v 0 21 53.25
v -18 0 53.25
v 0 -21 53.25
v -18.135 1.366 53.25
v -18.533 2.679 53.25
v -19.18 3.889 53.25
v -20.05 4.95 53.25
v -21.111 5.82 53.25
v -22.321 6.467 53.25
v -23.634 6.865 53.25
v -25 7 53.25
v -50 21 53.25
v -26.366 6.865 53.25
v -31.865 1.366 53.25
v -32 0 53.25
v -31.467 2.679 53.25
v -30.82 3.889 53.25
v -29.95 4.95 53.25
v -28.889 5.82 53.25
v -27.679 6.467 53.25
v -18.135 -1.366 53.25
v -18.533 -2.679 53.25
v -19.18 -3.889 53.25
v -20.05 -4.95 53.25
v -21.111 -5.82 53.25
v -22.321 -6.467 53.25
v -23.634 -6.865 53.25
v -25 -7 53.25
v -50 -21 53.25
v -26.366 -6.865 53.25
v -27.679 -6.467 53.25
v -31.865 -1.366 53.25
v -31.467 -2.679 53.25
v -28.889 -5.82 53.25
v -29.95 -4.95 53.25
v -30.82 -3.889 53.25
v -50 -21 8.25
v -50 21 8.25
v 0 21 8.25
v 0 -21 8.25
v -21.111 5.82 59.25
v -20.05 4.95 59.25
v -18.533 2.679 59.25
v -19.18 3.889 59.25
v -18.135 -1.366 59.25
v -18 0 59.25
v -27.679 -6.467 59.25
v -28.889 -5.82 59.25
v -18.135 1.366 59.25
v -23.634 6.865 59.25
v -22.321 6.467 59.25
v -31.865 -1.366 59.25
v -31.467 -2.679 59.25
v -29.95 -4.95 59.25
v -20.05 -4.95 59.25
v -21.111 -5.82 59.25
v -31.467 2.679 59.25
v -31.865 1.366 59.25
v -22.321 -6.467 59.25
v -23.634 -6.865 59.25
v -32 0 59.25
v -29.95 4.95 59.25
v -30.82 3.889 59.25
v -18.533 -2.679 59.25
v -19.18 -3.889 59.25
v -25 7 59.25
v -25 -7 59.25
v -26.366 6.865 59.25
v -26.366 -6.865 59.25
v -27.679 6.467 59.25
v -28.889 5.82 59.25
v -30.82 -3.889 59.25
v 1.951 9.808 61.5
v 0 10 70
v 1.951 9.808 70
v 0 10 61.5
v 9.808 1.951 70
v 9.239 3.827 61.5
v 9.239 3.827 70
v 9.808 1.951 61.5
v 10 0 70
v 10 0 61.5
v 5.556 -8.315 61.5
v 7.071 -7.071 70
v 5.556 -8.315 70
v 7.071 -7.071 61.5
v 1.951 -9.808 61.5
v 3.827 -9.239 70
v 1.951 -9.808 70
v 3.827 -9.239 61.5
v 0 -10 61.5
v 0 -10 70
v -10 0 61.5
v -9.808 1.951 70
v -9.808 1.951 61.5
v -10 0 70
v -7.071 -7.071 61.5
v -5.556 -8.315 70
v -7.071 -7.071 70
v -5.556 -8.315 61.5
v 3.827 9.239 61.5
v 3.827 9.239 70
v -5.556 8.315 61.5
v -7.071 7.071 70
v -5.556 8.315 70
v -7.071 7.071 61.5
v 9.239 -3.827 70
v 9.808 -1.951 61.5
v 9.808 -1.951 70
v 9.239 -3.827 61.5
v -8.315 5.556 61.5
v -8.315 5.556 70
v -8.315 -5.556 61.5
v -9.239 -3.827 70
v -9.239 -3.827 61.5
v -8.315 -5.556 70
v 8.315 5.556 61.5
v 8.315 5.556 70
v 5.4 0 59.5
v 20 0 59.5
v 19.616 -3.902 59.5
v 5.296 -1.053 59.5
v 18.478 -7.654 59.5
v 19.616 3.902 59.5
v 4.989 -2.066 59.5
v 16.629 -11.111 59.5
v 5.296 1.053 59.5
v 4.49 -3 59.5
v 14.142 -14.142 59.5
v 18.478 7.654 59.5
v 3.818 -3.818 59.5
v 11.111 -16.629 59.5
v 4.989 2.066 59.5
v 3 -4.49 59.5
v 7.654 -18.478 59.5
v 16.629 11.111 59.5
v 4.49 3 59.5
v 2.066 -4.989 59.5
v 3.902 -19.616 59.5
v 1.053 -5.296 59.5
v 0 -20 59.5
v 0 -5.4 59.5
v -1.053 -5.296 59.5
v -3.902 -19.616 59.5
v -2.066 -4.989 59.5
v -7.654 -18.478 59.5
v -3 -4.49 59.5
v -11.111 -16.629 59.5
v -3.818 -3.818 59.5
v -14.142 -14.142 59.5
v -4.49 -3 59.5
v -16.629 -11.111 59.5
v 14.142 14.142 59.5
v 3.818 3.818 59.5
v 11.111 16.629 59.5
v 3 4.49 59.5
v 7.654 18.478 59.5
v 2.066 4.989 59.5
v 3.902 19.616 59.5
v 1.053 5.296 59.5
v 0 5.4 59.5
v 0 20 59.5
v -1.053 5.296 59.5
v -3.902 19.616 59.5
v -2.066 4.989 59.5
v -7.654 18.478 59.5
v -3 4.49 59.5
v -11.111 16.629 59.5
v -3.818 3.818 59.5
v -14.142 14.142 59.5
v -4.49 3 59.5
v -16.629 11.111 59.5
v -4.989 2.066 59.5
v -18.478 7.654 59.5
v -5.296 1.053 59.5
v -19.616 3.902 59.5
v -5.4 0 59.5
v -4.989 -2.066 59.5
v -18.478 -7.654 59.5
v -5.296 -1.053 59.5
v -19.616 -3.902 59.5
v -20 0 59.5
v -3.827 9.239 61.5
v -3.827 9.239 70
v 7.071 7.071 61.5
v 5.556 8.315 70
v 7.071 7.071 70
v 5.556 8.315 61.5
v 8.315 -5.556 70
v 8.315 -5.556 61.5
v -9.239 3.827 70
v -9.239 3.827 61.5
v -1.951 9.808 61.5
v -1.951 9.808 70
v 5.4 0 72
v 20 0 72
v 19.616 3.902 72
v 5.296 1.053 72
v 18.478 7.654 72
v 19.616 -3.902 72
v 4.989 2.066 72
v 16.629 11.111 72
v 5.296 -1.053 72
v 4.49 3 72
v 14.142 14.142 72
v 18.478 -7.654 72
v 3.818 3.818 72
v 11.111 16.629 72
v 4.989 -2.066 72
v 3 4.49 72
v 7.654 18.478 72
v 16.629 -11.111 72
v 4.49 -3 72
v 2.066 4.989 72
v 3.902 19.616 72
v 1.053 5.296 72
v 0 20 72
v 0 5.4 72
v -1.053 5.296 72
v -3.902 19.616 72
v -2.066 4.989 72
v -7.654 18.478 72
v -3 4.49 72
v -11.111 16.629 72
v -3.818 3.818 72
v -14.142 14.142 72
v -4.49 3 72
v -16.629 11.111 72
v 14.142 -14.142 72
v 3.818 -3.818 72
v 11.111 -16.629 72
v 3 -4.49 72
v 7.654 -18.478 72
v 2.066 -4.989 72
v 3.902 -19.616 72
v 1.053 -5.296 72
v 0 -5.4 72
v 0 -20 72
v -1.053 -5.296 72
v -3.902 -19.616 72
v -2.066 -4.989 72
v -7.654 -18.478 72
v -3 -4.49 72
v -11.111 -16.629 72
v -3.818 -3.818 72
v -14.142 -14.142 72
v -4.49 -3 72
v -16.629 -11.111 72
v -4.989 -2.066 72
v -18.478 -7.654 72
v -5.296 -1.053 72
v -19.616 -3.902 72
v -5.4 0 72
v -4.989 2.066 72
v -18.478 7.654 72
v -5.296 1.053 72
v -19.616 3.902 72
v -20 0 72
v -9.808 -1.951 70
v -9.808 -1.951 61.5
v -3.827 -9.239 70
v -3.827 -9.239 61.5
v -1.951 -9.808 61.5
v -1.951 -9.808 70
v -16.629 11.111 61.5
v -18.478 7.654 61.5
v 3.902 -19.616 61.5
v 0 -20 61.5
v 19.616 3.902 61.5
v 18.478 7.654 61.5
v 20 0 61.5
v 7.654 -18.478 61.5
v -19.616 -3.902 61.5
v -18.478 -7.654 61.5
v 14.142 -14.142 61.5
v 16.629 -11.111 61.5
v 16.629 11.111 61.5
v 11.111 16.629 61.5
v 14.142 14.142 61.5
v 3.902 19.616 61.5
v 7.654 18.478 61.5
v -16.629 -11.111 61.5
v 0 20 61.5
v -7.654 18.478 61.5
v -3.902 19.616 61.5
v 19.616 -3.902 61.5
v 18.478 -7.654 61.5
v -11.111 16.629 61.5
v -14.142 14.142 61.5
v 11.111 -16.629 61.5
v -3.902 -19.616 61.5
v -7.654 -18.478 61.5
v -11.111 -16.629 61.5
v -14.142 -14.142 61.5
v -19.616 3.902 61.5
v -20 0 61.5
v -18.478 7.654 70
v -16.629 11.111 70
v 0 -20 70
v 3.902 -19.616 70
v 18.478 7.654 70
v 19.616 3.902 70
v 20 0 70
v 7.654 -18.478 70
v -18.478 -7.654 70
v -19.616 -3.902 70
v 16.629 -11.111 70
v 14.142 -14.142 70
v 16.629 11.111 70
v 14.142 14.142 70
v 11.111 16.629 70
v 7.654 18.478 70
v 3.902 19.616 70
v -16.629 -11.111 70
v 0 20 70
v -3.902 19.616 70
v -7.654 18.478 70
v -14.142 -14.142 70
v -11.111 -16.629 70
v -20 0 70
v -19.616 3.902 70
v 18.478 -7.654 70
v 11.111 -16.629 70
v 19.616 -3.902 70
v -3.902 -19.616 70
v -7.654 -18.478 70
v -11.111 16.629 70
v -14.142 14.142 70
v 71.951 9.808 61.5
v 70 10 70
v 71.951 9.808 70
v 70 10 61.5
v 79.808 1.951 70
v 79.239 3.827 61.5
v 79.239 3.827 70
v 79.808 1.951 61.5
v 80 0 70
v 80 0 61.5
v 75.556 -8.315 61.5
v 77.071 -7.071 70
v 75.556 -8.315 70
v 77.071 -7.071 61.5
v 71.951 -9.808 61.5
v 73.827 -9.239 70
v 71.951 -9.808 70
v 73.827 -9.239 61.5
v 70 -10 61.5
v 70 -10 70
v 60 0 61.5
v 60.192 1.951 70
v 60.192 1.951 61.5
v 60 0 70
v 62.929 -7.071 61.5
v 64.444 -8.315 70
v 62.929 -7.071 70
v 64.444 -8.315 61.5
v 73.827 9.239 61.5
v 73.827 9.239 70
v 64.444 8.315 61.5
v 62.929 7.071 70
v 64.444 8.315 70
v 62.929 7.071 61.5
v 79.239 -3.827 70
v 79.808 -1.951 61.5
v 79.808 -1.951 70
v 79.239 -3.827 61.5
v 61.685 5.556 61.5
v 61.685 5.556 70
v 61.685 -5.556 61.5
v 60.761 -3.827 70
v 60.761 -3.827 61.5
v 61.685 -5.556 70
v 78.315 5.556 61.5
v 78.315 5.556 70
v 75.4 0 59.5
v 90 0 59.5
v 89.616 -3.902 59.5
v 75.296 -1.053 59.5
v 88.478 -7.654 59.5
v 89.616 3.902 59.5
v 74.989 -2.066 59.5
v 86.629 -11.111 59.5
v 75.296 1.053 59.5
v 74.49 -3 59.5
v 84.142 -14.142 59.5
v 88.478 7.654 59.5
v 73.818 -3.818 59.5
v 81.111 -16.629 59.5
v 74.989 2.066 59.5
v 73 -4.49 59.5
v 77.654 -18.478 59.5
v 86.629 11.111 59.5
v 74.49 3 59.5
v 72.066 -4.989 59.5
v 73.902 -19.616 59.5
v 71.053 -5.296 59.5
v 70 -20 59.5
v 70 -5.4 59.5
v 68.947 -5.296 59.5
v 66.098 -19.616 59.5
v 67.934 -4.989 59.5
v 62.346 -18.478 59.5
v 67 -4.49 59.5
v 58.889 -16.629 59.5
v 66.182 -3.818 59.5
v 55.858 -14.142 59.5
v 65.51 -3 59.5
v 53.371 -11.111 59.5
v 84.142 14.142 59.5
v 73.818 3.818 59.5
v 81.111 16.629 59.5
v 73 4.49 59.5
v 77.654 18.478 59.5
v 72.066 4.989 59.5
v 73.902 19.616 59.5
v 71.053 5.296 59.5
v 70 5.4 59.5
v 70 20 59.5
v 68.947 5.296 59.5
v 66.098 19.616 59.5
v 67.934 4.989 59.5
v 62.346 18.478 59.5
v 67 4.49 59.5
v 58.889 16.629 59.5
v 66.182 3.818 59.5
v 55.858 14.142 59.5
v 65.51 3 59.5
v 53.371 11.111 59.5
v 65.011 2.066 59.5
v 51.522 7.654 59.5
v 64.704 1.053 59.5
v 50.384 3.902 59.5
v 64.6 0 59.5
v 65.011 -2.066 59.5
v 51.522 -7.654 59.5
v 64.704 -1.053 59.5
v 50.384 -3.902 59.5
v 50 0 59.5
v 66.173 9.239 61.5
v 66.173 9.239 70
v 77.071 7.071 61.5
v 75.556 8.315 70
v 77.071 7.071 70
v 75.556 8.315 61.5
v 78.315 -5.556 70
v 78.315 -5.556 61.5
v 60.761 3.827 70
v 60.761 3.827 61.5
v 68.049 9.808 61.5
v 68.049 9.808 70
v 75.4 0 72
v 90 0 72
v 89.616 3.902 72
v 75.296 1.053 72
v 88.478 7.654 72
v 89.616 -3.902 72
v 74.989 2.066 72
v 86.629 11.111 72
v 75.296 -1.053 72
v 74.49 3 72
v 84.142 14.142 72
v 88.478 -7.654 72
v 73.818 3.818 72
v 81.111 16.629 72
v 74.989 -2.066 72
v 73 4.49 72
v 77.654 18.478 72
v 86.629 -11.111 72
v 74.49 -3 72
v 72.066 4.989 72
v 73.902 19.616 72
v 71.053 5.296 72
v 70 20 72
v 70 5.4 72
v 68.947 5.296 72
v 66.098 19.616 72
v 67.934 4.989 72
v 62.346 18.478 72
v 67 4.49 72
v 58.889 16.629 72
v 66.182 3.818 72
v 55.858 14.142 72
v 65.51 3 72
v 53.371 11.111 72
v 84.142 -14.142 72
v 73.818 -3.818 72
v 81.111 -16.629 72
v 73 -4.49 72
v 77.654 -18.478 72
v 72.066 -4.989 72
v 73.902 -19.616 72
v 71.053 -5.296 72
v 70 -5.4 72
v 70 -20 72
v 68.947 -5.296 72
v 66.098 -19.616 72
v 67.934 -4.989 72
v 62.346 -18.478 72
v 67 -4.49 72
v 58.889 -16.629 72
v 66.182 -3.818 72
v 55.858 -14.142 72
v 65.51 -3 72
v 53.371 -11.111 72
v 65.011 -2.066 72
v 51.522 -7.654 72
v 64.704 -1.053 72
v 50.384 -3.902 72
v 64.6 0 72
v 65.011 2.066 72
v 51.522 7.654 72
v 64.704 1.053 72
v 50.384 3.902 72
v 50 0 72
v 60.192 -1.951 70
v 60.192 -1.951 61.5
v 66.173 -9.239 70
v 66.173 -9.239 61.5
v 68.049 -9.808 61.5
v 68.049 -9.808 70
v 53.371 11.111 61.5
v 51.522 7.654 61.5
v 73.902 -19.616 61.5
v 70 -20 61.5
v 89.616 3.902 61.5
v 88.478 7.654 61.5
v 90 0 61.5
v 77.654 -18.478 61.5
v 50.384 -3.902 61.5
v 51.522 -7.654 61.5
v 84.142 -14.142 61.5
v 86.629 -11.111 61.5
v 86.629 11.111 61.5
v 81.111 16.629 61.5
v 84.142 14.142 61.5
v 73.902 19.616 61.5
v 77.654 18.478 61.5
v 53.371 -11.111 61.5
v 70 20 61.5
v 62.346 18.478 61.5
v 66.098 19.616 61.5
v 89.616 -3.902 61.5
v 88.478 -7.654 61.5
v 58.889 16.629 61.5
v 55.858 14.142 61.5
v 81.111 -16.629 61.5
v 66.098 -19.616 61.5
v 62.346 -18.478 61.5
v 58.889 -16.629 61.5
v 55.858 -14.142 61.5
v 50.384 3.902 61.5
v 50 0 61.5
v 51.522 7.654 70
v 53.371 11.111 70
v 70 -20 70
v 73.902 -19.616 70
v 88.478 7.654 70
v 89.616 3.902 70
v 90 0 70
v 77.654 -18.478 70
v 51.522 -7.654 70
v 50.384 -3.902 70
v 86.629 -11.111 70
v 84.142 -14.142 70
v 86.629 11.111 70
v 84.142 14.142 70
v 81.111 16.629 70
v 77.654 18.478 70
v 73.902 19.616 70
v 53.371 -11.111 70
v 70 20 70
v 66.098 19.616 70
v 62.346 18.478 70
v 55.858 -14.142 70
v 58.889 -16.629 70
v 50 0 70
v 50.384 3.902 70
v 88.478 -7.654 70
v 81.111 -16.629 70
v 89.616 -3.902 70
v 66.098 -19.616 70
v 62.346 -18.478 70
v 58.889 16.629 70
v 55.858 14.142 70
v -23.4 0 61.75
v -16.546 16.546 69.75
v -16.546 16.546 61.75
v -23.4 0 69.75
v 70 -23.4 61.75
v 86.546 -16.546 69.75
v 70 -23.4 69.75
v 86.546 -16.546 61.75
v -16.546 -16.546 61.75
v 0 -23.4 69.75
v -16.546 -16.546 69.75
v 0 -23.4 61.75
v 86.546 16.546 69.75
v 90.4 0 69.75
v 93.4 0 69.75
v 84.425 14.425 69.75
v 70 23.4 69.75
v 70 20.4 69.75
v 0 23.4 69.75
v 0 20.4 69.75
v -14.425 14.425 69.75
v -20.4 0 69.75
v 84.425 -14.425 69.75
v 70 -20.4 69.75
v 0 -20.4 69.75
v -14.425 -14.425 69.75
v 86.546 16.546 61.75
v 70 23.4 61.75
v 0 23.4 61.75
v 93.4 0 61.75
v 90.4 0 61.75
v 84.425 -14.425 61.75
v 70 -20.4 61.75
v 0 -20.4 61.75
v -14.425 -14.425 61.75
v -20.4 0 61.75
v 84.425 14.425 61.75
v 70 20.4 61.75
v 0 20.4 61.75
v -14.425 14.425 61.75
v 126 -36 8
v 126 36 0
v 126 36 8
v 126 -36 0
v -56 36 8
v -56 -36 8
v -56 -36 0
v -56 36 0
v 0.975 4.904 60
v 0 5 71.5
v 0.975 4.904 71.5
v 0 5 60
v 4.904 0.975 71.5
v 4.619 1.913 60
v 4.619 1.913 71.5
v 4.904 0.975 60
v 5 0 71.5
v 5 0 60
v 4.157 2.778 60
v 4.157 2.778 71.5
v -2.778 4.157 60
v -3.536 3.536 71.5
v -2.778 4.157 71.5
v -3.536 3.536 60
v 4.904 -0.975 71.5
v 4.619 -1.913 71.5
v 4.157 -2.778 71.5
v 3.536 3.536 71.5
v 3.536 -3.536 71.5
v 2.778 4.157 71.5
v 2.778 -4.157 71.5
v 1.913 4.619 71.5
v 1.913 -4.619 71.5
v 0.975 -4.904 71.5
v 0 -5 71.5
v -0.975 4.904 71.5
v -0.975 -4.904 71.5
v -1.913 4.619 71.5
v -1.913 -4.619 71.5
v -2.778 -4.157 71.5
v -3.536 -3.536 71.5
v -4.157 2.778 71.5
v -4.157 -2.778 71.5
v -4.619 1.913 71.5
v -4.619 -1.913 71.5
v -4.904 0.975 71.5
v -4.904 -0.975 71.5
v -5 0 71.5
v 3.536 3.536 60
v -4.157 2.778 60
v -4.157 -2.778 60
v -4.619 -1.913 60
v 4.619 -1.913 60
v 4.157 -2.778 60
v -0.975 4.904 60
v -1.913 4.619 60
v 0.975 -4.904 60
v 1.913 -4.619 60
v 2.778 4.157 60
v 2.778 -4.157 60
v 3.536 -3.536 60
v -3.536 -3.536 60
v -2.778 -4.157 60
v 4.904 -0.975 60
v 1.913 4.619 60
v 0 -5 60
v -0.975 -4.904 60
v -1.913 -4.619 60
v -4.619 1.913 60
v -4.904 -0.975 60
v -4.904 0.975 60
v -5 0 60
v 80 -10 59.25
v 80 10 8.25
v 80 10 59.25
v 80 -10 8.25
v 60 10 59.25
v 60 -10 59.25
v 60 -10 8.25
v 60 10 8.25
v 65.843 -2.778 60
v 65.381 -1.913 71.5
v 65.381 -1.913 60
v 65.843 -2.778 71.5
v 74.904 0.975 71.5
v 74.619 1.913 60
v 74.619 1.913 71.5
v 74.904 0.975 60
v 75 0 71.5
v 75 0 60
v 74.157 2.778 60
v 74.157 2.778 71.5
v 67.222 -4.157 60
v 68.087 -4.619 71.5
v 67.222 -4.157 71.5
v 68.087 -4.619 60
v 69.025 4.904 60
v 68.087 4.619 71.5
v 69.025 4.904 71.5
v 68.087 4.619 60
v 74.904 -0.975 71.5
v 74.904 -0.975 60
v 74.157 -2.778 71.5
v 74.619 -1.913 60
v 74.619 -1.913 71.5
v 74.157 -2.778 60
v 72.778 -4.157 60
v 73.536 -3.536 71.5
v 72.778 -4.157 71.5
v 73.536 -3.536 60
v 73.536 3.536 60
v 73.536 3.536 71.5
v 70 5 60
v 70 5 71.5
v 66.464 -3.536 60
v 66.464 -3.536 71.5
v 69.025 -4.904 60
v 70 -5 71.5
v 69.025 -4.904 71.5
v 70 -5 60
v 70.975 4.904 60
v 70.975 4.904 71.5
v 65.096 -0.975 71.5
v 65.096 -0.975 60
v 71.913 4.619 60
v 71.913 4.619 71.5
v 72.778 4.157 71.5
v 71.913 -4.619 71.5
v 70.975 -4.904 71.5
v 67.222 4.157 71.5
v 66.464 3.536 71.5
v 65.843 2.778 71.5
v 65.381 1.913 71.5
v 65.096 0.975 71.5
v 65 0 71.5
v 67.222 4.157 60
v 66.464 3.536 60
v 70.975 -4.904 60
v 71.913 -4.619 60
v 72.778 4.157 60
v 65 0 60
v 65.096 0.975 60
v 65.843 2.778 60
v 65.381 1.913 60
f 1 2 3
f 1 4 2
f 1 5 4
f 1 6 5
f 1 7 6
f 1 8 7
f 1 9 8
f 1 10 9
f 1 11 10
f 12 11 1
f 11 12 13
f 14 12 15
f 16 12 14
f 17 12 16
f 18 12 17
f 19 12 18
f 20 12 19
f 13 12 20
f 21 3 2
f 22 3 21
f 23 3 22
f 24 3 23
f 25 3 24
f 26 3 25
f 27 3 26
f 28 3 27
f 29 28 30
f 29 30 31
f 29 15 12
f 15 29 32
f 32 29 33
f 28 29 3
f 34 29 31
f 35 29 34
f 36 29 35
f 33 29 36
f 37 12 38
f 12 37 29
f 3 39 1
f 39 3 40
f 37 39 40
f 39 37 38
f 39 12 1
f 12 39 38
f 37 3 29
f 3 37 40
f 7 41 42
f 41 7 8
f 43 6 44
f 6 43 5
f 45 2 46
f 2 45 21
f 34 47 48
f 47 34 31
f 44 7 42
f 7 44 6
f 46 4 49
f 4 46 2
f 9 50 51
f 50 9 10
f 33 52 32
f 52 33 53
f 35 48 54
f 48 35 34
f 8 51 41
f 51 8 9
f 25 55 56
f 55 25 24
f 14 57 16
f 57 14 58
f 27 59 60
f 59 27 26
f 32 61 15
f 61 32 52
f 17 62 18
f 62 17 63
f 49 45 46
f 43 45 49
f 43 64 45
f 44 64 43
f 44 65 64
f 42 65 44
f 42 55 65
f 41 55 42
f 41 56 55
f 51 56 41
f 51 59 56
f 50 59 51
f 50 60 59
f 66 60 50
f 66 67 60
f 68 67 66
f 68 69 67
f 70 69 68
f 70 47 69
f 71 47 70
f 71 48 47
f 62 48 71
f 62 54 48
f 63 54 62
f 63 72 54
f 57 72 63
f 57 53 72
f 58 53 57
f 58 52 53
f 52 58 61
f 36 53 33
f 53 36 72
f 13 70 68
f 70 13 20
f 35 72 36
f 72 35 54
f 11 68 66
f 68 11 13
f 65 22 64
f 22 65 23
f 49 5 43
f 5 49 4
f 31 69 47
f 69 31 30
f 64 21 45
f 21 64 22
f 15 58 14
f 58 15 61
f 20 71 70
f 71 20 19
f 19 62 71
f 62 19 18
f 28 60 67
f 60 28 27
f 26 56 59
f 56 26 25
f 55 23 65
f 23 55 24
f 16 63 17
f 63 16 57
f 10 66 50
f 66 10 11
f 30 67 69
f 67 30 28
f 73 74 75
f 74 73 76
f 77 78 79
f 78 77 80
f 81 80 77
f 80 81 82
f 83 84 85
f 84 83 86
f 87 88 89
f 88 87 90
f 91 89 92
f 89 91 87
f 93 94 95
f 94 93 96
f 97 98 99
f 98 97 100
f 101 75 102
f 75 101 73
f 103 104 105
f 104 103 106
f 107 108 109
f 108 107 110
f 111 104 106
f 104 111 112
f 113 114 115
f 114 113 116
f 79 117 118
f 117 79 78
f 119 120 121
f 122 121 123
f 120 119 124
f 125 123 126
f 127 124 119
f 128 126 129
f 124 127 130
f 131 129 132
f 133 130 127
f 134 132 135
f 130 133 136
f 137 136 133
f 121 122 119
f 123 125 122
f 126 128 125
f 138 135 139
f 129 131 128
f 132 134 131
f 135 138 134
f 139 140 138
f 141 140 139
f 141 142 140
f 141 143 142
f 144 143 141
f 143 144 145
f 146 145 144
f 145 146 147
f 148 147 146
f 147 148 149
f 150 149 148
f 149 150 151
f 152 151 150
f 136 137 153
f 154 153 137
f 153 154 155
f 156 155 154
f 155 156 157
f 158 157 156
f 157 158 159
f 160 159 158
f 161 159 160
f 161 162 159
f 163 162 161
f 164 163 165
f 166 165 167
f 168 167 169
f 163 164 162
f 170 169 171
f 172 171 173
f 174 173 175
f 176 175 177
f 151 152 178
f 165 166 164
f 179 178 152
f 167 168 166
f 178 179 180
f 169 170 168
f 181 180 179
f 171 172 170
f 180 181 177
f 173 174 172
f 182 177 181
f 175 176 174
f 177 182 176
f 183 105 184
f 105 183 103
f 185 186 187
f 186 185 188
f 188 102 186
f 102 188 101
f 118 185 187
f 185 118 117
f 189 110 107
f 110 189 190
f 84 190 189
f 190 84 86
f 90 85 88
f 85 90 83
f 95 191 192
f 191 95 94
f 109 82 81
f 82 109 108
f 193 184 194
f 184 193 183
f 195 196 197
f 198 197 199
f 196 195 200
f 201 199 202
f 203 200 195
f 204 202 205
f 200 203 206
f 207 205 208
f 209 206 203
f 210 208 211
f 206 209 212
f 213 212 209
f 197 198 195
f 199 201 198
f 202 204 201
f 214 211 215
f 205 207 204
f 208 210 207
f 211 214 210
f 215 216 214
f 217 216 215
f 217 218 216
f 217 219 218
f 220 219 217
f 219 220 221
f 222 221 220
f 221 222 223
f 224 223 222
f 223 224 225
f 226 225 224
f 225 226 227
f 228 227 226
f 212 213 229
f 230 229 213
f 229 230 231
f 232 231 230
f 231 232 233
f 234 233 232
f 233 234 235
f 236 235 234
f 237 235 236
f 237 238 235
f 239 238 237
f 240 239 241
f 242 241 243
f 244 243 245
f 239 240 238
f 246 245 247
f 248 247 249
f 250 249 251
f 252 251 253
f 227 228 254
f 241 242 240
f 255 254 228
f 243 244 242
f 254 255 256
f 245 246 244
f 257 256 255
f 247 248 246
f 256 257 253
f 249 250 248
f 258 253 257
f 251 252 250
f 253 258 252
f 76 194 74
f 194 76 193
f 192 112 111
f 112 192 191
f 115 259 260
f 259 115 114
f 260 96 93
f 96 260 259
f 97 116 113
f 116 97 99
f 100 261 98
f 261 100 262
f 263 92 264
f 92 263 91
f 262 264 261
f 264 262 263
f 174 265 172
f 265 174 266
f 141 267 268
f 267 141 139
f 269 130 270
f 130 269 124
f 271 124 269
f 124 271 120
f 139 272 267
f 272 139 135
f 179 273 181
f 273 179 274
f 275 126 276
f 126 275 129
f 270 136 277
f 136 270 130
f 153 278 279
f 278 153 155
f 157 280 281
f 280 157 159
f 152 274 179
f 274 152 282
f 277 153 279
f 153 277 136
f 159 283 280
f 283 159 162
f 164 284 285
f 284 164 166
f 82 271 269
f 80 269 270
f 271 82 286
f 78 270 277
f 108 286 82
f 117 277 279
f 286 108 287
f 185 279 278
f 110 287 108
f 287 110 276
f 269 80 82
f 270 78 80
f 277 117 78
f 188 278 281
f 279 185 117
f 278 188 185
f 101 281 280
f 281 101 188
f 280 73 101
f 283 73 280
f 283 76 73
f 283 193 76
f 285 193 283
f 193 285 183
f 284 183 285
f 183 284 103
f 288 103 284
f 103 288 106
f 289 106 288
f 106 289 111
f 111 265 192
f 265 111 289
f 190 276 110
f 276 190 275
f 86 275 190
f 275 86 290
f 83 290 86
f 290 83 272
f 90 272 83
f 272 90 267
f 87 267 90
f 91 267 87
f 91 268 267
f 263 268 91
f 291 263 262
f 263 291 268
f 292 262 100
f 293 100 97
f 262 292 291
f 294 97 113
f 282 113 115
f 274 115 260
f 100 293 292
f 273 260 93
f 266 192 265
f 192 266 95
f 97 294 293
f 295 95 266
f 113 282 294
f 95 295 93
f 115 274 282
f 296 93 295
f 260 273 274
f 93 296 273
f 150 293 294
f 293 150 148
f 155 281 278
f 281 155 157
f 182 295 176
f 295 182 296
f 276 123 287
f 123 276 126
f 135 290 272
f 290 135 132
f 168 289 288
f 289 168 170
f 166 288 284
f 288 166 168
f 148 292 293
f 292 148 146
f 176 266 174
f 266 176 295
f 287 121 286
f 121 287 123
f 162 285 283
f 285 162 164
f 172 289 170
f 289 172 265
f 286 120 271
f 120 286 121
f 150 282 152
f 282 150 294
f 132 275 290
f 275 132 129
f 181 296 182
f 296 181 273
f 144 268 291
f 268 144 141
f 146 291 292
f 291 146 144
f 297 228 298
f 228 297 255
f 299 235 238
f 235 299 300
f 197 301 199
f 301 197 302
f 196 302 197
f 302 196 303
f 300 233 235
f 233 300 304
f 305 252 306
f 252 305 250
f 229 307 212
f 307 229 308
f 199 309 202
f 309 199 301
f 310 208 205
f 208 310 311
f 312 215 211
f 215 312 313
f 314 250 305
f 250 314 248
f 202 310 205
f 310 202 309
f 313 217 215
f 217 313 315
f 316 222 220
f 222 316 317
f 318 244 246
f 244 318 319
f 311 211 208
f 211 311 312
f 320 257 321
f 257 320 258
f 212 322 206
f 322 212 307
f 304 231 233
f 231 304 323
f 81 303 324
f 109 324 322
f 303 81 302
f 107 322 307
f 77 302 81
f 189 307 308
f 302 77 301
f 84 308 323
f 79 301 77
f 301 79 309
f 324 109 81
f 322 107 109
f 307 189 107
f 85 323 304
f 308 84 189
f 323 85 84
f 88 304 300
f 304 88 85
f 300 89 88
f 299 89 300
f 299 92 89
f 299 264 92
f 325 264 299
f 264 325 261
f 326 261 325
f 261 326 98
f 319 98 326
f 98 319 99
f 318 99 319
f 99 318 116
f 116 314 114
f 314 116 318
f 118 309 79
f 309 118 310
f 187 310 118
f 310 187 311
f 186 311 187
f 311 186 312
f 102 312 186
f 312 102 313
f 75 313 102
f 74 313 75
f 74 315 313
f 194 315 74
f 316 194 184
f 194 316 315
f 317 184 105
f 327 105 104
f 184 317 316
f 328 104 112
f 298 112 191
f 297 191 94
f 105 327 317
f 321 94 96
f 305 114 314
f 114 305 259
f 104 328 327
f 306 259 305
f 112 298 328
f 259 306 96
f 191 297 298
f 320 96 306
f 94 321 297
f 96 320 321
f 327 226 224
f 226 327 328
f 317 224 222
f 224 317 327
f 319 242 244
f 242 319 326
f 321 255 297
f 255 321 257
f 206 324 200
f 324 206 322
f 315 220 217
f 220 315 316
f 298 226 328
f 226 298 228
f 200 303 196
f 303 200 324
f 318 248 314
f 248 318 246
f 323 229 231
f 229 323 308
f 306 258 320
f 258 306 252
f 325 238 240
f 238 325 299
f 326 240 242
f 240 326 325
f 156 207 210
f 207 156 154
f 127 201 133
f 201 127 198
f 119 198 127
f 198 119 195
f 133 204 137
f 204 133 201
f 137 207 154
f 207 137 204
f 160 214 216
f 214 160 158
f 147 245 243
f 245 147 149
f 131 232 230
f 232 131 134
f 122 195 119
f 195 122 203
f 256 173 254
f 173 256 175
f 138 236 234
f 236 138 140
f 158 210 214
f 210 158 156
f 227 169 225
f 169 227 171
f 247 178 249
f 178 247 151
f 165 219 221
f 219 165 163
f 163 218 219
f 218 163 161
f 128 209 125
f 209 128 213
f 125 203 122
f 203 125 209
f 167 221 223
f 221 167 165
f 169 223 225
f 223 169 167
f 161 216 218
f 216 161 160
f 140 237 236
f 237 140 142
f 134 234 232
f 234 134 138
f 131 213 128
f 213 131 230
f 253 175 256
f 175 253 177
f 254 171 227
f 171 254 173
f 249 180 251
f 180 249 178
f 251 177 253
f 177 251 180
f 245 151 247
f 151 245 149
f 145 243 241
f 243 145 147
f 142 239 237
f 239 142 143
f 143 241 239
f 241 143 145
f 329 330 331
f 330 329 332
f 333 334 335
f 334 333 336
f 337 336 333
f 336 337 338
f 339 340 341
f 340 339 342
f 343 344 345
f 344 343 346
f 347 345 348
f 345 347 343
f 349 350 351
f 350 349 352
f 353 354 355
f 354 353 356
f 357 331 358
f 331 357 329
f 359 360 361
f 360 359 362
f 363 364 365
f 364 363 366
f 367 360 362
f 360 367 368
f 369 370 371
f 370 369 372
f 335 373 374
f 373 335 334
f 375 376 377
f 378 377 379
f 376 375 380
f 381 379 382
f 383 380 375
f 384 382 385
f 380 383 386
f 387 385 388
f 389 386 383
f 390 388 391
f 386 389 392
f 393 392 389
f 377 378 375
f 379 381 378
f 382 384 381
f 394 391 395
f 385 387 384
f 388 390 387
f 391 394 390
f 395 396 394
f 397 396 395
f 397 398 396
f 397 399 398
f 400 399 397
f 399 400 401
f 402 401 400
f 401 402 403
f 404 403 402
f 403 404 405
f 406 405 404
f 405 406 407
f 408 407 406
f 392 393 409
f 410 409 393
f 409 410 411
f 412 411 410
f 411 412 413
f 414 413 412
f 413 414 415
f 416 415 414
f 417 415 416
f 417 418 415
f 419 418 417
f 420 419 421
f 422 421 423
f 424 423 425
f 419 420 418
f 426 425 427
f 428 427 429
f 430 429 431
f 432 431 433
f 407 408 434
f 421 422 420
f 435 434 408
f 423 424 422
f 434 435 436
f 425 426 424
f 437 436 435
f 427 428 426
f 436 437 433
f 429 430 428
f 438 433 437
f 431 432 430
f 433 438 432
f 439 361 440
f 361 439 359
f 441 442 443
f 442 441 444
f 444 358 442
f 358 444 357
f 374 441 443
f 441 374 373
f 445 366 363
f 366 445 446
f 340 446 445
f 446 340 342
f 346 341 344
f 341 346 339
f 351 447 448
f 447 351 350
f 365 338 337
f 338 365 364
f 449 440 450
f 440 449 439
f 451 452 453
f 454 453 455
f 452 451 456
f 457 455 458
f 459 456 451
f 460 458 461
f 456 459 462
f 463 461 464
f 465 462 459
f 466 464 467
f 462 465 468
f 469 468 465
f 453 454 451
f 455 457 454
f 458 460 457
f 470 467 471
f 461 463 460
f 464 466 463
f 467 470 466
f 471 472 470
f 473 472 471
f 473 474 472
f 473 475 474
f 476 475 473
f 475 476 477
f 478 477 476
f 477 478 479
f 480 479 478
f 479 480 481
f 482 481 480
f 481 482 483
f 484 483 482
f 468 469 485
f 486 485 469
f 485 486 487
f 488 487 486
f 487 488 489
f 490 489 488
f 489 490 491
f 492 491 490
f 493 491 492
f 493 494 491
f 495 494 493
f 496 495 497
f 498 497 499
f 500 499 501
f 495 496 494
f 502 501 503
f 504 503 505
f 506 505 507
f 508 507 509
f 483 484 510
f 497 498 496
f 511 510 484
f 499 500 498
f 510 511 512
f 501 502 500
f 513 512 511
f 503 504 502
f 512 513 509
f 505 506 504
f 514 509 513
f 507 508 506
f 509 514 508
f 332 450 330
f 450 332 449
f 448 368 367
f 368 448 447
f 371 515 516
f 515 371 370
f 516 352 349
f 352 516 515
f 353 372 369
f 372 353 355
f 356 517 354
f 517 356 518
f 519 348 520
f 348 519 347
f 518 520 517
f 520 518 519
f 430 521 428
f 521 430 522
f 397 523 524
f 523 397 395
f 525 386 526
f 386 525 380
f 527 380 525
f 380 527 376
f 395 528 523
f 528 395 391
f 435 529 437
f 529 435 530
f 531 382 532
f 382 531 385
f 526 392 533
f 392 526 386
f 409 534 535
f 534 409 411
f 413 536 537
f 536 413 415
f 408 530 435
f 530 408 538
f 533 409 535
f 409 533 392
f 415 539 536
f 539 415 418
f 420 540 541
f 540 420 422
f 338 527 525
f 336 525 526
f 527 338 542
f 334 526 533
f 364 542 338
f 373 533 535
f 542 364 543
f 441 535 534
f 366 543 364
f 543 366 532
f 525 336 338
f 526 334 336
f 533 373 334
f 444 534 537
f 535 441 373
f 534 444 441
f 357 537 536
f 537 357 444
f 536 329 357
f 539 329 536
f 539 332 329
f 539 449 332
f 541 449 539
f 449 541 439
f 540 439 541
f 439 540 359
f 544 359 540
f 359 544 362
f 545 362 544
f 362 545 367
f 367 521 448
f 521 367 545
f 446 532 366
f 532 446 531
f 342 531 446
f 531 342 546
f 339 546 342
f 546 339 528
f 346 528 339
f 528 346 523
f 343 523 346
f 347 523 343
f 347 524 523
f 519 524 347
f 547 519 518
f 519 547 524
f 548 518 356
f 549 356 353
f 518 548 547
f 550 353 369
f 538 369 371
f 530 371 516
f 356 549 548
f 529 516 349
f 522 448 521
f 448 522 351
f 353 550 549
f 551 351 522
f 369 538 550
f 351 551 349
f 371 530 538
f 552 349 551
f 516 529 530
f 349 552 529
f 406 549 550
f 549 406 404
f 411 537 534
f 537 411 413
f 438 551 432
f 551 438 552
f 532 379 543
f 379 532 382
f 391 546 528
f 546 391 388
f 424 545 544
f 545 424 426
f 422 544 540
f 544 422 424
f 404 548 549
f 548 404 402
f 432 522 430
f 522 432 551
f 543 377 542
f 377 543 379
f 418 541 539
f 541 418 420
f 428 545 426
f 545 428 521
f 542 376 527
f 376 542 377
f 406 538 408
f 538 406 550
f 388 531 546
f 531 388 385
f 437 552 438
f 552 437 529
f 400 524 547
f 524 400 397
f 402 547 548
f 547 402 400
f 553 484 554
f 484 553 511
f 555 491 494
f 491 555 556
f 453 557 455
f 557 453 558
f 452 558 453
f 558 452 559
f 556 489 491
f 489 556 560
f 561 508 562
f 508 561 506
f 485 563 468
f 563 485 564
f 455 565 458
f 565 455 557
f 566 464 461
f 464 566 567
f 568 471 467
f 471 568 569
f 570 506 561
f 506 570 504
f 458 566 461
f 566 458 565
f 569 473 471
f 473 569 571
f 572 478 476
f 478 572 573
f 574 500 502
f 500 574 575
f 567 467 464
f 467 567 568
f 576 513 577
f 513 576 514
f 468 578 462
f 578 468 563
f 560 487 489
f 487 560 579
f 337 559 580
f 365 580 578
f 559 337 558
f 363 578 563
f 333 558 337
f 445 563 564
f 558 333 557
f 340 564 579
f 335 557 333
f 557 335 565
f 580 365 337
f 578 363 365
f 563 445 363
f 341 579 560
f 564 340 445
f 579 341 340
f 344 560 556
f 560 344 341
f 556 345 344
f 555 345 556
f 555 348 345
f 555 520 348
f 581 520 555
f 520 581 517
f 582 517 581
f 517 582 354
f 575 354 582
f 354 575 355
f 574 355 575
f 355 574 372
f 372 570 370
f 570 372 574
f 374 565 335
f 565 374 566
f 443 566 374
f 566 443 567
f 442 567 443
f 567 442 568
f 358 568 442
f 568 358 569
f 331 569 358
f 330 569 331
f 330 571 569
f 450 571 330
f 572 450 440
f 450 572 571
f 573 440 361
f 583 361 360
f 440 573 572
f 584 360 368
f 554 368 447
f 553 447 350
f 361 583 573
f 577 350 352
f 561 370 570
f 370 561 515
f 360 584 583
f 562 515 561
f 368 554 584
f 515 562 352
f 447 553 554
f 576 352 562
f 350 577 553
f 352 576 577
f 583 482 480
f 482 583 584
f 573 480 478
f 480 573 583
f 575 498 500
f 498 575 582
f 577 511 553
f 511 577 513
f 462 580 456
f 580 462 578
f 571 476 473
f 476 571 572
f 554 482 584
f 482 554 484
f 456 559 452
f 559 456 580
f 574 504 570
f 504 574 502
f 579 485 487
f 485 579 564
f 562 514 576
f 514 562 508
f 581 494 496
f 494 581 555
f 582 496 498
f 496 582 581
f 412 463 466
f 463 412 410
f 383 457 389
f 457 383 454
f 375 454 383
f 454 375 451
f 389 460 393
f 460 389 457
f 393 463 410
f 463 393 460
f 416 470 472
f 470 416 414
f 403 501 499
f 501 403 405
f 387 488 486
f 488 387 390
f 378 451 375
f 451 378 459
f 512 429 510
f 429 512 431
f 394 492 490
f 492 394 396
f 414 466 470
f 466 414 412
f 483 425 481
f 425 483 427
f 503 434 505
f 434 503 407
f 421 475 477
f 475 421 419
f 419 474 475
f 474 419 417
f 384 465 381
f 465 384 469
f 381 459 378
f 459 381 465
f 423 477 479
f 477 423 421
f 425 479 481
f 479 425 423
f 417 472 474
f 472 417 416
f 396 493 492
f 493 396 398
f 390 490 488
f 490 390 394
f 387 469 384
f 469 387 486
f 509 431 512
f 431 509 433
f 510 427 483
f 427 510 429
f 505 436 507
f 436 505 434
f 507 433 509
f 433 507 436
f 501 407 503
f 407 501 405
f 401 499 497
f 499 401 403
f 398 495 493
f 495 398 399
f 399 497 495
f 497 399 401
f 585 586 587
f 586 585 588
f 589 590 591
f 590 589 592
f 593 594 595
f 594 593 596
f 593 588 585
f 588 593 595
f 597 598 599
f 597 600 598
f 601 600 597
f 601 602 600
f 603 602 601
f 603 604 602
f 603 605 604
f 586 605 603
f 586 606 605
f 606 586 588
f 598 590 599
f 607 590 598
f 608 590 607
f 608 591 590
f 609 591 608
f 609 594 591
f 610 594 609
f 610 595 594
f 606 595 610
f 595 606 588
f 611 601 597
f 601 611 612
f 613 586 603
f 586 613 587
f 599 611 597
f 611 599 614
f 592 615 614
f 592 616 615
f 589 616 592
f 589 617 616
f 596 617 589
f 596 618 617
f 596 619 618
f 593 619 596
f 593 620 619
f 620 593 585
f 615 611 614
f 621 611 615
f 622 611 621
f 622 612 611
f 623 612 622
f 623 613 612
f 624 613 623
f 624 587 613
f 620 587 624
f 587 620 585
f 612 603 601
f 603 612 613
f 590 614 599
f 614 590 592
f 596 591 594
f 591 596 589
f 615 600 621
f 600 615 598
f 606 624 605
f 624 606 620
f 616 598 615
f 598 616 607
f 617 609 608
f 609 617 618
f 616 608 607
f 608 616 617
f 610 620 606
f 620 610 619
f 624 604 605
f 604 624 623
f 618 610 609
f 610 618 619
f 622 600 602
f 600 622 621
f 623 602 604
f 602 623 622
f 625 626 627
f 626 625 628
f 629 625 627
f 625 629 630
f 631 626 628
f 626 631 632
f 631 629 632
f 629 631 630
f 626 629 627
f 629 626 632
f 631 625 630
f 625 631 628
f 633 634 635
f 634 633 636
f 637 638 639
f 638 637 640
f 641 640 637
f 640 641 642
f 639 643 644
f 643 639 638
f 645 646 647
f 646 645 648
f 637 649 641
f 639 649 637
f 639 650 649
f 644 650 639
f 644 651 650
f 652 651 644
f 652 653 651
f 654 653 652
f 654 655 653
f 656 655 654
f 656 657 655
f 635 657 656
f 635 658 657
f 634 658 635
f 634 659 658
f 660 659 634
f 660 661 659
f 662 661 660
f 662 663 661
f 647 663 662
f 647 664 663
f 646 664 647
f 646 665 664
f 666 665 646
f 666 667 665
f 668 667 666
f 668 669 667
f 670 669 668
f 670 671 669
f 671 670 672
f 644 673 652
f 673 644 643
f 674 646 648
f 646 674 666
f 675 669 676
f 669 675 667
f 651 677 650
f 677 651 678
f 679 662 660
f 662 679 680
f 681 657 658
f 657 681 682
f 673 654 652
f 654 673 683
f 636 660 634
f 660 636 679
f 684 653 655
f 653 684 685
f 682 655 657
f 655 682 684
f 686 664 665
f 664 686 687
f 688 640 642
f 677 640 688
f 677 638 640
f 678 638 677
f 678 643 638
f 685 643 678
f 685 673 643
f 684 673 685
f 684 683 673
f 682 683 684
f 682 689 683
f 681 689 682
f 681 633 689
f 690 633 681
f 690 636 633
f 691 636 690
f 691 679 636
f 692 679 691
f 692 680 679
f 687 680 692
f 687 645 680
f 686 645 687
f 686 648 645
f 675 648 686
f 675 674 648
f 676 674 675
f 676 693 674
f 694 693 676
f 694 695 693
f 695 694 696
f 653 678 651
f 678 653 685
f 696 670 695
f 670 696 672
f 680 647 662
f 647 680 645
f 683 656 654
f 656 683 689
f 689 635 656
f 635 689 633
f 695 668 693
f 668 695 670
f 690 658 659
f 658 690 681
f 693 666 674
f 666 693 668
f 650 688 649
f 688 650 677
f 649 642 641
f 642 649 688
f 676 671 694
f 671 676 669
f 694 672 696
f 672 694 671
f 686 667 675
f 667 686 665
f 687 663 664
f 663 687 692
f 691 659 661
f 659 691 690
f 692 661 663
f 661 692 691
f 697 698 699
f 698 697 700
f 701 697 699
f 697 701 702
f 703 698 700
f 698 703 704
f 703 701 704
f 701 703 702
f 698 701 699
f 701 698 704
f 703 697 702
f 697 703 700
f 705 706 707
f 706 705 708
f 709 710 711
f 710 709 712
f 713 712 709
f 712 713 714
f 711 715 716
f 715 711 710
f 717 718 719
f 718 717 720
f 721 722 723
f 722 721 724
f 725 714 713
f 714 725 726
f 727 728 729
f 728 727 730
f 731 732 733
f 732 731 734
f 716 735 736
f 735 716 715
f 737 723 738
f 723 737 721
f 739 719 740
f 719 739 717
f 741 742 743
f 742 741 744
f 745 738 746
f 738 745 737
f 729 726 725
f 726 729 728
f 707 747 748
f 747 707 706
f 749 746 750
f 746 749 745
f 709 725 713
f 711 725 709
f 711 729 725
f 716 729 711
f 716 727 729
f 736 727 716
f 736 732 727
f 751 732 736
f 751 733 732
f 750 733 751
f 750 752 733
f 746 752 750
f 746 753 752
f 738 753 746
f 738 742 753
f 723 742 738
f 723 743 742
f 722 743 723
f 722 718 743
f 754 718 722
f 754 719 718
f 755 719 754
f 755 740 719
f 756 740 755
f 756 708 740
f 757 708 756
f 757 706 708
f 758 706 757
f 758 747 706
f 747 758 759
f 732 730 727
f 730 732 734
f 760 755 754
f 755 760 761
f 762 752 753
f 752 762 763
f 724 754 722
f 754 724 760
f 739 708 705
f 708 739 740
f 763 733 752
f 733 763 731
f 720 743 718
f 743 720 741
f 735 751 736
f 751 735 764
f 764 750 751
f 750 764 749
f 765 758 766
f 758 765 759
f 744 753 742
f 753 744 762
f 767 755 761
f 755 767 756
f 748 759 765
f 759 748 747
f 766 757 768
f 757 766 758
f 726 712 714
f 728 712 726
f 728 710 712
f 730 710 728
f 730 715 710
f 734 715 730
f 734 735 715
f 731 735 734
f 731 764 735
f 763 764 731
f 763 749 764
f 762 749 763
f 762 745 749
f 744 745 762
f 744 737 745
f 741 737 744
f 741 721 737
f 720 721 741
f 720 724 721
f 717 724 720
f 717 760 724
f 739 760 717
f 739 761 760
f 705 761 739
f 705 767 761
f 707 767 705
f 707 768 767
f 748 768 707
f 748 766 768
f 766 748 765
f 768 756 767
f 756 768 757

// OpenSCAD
$fn = 32;

// ------------------------------------------------------------------------
// Motor belt drive: span 70 mm, pulleys d40, belt 8 mm wide
// Every part is its own module, assembly() places every instance.
// ------------------------------------------------------------------------

// --- part 1 ---
module base_plate() {
  difference() {
    translate([-91, -36, 0]) cube([182, 72, 8]);
  }
}

// --- part 2 ---
module motor() {
  union() {
    translate([-22.5, -21, 0]) cube([45, 42, 50]);
    translate([25.5, 0, 25]) rotate([0, 90, 0]) cylinder(h = 6, d = 14, center = true);
  }
}

// --- part 3 ---
module drive_shaft() {
  translate([0, 0, -5.75]) cylinder(h = 11.5, d = 10);
}

// --- part 4 ---
module pulley_drive() {
  difference() {
    union() {
      cylinder(h = 12.5, d = 20);
      cylinder(h = 2, d = 40);
      translate([0, 0, 10.5]) cylinder(h = 2, d = 40);
    }
    translate([0, 0, -1]) cylinder(h = 14.5, d = 10.8);
  }
}

// --- part 5 ---
module idler_post() {
  translate([-10, -10, 0]) cube([20, 20, 51]);
}

// --- part 6 ---
module driven_shaft() {
  translate([0, 0, -5.75]) cylinder(h = 11.5, d = 10);
}

// --- part 7 ---
module pulley_driven() {
  difference() {
    union() {
      cylinder(h = 12.5, d = 20);
      cylinder(h = 2, d = 40);
      translate([0, 0, 10.5]) cylinder(h = 2, d = 40);
    }
    translate([0, 0, -1]) cylinder(h = 14.5, d = 10.8);
  }
}

// --- part 8 ---
module drive_belt() {
  difference() {
    linear_extrude(height = 8) polygon(points = concat([for (a = [90 : 45 : 270]) [23.4 * cos(a), 23.4 * sin(a)]], [for (a = [270 : 45 : 450]) [70 + 23.4 * cos(a), 23.4 * sin(a)]]));
    translate([0, 0, -1]) linear_extrude(height = 10) polygon(points = concat([for (a = [90 : 45 : 270]) [20.4 * cos(a), 20.4 * sin(a)]], [for (a = [270 : 45 : 450]) [70 + 20.4 * cos(a), 20.4 * sin(a)]]));
  }
}

// --- assembly ---
module assembly() {
  color([0.80, 0.24, 0.20]) translate([35, 0, 0]) rotate([0, 0, 0]) base_plate();
  color([0.20, 0.45, 0.75]) translate([0, 0, 30.75]) rotate([0, 270, 0]) motor();
  color([0.25, 0.62, 0.32]) translate([0, 0, 65.75]) rotate([0, 0, 0]) drive_shaft();
  color([0.92, 0.70, 0.18]) translate([0, 0, 59.5]) rotate([0, 0, 0]) pulley_drive();
  color([0.58, 0.35, 0.70]) translate([70, 0, 8.25]) rotate([0, 0, 0]) idler_post();
  color([0.16, 0.66, 0.66]) translate([70, 0, 65.75]) rotate([0, 0, 0]) driven_shaft();
  color([0.85, 0.48, 0.18]) translate([70, 0, 59.5]) rotate([0, 0, 0]) pulley_driven();
  color([0.55, 0.60, 0.65]) translate([0, 0, 61.75]) rotate([0, 0, 0]) drive_belt();
}

assembly();
